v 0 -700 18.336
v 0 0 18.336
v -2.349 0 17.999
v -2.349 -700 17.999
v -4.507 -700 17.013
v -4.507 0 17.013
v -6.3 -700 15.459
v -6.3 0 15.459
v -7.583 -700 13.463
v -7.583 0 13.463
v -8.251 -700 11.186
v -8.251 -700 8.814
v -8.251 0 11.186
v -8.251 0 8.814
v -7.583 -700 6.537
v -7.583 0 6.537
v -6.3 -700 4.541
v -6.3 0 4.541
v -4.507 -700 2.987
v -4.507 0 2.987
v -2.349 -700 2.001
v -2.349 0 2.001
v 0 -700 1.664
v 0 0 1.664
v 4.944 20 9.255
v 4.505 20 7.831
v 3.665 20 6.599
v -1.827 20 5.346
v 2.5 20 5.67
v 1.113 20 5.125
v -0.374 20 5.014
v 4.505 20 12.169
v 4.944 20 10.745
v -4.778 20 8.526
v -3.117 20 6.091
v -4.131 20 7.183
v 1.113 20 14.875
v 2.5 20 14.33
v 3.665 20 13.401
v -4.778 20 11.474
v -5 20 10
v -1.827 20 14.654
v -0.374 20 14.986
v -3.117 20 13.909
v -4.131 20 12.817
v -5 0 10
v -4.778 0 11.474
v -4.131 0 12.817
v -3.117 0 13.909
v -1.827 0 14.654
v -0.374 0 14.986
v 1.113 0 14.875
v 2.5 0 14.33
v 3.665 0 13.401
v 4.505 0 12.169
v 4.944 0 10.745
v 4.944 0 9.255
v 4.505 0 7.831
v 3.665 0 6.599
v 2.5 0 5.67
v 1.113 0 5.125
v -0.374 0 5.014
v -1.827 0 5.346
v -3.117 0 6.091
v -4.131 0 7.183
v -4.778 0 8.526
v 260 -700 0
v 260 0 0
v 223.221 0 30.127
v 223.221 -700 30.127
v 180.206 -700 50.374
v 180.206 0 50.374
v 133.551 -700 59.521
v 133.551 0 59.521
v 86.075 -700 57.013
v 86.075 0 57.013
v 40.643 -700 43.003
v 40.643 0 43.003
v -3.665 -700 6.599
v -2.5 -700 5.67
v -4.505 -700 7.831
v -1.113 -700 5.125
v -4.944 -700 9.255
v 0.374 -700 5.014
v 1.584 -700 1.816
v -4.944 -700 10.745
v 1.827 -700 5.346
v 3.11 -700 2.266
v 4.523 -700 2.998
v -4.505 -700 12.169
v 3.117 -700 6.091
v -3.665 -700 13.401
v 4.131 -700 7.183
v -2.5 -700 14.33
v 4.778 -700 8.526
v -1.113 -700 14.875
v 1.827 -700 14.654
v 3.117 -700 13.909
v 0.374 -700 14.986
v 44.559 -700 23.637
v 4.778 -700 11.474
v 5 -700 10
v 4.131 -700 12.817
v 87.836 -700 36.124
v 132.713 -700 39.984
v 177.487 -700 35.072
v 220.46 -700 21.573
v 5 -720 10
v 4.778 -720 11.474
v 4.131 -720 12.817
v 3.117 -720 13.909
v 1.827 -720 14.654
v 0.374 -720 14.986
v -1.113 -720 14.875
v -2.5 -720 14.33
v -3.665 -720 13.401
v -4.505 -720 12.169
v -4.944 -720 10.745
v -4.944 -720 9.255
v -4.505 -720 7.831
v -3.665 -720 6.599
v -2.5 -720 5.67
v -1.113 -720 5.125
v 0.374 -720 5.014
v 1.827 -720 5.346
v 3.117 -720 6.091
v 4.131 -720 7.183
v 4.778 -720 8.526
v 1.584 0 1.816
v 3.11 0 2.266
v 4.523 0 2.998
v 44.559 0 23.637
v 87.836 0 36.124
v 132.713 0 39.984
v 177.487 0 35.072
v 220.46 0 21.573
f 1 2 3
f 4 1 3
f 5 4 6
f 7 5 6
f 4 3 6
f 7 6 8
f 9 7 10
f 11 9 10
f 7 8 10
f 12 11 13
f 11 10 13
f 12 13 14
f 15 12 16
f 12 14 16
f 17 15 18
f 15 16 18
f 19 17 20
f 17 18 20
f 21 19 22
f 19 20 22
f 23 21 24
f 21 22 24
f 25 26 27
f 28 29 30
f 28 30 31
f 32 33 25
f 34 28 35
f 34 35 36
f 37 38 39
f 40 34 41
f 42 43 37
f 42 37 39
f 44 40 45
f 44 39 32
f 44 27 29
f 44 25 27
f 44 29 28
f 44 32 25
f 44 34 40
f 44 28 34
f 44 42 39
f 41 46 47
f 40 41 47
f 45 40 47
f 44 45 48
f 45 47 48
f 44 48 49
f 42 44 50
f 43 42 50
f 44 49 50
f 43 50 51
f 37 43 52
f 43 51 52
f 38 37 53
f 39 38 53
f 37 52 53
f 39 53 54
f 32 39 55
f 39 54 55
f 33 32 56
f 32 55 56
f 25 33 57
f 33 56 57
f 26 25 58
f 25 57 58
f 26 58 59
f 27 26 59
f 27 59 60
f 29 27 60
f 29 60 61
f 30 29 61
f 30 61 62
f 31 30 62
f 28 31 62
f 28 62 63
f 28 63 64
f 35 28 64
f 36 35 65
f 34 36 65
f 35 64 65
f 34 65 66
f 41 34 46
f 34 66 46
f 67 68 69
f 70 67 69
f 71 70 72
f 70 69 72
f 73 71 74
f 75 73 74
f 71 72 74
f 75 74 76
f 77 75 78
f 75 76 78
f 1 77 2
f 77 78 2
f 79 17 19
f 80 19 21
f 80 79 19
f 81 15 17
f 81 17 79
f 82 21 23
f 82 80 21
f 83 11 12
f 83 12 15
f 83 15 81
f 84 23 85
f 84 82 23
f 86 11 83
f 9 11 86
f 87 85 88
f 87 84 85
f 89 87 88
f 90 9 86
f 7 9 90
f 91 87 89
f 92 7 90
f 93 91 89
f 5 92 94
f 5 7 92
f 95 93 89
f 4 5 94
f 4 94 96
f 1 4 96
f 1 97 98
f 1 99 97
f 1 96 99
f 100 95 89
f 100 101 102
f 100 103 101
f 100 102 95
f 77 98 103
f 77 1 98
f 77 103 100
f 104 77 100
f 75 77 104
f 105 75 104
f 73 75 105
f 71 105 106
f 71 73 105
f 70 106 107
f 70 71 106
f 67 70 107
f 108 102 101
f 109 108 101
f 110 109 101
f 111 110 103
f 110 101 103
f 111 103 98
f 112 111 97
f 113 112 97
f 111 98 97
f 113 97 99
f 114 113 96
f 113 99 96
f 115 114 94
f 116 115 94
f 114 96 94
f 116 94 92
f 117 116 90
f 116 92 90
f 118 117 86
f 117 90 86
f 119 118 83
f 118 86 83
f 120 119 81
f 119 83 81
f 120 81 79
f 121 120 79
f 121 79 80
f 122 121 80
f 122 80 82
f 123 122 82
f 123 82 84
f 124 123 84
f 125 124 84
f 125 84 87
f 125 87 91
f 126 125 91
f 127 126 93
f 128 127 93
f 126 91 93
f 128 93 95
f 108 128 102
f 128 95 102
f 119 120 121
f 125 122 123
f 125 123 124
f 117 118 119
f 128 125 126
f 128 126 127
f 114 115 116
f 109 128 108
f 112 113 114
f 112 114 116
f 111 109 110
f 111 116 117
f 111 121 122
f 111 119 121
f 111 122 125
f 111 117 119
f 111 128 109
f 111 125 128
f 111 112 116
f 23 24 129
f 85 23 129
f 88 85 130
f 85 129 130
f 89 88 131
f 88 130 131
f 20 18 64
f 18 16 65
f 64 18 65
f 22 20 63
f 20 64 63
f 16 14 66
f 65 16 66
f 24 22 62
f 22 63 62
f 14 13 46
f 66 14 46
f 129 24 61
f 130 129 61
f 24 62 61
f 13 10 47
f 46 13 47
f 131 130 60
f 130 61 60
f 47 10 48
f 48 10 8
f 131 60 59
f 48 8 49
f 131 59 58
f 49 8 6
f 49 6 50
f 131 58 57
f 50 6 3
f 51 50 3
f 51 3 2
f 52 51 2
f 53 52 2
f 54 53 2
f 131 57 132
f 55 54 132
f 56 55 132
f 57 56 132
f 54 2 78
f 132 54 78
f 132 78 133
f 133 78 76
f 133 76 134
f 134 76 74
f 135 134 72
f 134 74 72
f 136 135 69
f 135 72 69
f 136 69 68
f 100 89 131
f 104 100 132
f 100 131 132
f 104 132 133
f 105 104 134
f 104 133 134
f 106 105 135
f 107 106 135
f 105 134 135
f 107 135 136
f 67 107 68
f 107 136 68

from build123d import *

# Parameters (mm, degrees)
F1_DEPTH = 700
F2_R     = 5
F3_DEPTH = 20
F4_R     = 5
F5_DEPTH = 20


with BuildPart() as f1:
    # F0 (on Front) → F1 (new body)
    with BuildSketch(Plane.XZ):
        with BuildLine():
            ThreePointArc((4.5232568237, 2.9976497203), (132.7131971979, 39.9840828273), (260, 0))
            ThreePointArc((260, 0), (133.5510610534, 59.5206573171), (0, 18.3362318665))
            ThreePointArc((0, 18.3362318665), (5.8946060824, 15.8946060824), (8.3362318665, 10))
            ThreePointArc((8.3362318665, 10), (7.3211911397, 6.0134072155), (4.5232568237, 2.9976497203))
        make_face()
        with BuildLine():
            Line((0, 18.3362318665), (0, 1.6637681335))
            ThreePointArc((0, 1.6637681335), (2.3579171095, 2.0041893071), (4.5232568237, 2.9976497203))
            ThreePointArc((4.5232568237, 2.9976497203), (7.3211911397, 6.0134072155), (8.3362318665, 10))
            ThreePointArc((8.3362318665, 10), (5.8946060824, 15.8946060824), (0, 18.3362318665))
        make_face()
        with BuildLine():
            ThreePointArc((0, 18.3362318665), (-8.3362318665, 10), (0, 1.6637681335))
            Line((0, 1.6637681335), (0, 18.3362318665))
        make_face()
    extrude(amount=F1_DEPTH)

    # F2 (on face) → F3 (join)
    with BuildSketch(Plane.XZ.offset(700)):
        with Locations((0, 10)):
            Circle(F2_R)
    extrude(amount=F3_DEPTH)

    # F4 (on face) → F5 (join)
    with BuildSketch(Plane(origin=(0, 0, 0), x_dir=(-1, 0, 0), z_dir=(0, 1, 0))):
        with Locations((0, 10)):
            Circle(F4_R)
    extrude(amount=F5_DEPTH)


solid = f1.part
